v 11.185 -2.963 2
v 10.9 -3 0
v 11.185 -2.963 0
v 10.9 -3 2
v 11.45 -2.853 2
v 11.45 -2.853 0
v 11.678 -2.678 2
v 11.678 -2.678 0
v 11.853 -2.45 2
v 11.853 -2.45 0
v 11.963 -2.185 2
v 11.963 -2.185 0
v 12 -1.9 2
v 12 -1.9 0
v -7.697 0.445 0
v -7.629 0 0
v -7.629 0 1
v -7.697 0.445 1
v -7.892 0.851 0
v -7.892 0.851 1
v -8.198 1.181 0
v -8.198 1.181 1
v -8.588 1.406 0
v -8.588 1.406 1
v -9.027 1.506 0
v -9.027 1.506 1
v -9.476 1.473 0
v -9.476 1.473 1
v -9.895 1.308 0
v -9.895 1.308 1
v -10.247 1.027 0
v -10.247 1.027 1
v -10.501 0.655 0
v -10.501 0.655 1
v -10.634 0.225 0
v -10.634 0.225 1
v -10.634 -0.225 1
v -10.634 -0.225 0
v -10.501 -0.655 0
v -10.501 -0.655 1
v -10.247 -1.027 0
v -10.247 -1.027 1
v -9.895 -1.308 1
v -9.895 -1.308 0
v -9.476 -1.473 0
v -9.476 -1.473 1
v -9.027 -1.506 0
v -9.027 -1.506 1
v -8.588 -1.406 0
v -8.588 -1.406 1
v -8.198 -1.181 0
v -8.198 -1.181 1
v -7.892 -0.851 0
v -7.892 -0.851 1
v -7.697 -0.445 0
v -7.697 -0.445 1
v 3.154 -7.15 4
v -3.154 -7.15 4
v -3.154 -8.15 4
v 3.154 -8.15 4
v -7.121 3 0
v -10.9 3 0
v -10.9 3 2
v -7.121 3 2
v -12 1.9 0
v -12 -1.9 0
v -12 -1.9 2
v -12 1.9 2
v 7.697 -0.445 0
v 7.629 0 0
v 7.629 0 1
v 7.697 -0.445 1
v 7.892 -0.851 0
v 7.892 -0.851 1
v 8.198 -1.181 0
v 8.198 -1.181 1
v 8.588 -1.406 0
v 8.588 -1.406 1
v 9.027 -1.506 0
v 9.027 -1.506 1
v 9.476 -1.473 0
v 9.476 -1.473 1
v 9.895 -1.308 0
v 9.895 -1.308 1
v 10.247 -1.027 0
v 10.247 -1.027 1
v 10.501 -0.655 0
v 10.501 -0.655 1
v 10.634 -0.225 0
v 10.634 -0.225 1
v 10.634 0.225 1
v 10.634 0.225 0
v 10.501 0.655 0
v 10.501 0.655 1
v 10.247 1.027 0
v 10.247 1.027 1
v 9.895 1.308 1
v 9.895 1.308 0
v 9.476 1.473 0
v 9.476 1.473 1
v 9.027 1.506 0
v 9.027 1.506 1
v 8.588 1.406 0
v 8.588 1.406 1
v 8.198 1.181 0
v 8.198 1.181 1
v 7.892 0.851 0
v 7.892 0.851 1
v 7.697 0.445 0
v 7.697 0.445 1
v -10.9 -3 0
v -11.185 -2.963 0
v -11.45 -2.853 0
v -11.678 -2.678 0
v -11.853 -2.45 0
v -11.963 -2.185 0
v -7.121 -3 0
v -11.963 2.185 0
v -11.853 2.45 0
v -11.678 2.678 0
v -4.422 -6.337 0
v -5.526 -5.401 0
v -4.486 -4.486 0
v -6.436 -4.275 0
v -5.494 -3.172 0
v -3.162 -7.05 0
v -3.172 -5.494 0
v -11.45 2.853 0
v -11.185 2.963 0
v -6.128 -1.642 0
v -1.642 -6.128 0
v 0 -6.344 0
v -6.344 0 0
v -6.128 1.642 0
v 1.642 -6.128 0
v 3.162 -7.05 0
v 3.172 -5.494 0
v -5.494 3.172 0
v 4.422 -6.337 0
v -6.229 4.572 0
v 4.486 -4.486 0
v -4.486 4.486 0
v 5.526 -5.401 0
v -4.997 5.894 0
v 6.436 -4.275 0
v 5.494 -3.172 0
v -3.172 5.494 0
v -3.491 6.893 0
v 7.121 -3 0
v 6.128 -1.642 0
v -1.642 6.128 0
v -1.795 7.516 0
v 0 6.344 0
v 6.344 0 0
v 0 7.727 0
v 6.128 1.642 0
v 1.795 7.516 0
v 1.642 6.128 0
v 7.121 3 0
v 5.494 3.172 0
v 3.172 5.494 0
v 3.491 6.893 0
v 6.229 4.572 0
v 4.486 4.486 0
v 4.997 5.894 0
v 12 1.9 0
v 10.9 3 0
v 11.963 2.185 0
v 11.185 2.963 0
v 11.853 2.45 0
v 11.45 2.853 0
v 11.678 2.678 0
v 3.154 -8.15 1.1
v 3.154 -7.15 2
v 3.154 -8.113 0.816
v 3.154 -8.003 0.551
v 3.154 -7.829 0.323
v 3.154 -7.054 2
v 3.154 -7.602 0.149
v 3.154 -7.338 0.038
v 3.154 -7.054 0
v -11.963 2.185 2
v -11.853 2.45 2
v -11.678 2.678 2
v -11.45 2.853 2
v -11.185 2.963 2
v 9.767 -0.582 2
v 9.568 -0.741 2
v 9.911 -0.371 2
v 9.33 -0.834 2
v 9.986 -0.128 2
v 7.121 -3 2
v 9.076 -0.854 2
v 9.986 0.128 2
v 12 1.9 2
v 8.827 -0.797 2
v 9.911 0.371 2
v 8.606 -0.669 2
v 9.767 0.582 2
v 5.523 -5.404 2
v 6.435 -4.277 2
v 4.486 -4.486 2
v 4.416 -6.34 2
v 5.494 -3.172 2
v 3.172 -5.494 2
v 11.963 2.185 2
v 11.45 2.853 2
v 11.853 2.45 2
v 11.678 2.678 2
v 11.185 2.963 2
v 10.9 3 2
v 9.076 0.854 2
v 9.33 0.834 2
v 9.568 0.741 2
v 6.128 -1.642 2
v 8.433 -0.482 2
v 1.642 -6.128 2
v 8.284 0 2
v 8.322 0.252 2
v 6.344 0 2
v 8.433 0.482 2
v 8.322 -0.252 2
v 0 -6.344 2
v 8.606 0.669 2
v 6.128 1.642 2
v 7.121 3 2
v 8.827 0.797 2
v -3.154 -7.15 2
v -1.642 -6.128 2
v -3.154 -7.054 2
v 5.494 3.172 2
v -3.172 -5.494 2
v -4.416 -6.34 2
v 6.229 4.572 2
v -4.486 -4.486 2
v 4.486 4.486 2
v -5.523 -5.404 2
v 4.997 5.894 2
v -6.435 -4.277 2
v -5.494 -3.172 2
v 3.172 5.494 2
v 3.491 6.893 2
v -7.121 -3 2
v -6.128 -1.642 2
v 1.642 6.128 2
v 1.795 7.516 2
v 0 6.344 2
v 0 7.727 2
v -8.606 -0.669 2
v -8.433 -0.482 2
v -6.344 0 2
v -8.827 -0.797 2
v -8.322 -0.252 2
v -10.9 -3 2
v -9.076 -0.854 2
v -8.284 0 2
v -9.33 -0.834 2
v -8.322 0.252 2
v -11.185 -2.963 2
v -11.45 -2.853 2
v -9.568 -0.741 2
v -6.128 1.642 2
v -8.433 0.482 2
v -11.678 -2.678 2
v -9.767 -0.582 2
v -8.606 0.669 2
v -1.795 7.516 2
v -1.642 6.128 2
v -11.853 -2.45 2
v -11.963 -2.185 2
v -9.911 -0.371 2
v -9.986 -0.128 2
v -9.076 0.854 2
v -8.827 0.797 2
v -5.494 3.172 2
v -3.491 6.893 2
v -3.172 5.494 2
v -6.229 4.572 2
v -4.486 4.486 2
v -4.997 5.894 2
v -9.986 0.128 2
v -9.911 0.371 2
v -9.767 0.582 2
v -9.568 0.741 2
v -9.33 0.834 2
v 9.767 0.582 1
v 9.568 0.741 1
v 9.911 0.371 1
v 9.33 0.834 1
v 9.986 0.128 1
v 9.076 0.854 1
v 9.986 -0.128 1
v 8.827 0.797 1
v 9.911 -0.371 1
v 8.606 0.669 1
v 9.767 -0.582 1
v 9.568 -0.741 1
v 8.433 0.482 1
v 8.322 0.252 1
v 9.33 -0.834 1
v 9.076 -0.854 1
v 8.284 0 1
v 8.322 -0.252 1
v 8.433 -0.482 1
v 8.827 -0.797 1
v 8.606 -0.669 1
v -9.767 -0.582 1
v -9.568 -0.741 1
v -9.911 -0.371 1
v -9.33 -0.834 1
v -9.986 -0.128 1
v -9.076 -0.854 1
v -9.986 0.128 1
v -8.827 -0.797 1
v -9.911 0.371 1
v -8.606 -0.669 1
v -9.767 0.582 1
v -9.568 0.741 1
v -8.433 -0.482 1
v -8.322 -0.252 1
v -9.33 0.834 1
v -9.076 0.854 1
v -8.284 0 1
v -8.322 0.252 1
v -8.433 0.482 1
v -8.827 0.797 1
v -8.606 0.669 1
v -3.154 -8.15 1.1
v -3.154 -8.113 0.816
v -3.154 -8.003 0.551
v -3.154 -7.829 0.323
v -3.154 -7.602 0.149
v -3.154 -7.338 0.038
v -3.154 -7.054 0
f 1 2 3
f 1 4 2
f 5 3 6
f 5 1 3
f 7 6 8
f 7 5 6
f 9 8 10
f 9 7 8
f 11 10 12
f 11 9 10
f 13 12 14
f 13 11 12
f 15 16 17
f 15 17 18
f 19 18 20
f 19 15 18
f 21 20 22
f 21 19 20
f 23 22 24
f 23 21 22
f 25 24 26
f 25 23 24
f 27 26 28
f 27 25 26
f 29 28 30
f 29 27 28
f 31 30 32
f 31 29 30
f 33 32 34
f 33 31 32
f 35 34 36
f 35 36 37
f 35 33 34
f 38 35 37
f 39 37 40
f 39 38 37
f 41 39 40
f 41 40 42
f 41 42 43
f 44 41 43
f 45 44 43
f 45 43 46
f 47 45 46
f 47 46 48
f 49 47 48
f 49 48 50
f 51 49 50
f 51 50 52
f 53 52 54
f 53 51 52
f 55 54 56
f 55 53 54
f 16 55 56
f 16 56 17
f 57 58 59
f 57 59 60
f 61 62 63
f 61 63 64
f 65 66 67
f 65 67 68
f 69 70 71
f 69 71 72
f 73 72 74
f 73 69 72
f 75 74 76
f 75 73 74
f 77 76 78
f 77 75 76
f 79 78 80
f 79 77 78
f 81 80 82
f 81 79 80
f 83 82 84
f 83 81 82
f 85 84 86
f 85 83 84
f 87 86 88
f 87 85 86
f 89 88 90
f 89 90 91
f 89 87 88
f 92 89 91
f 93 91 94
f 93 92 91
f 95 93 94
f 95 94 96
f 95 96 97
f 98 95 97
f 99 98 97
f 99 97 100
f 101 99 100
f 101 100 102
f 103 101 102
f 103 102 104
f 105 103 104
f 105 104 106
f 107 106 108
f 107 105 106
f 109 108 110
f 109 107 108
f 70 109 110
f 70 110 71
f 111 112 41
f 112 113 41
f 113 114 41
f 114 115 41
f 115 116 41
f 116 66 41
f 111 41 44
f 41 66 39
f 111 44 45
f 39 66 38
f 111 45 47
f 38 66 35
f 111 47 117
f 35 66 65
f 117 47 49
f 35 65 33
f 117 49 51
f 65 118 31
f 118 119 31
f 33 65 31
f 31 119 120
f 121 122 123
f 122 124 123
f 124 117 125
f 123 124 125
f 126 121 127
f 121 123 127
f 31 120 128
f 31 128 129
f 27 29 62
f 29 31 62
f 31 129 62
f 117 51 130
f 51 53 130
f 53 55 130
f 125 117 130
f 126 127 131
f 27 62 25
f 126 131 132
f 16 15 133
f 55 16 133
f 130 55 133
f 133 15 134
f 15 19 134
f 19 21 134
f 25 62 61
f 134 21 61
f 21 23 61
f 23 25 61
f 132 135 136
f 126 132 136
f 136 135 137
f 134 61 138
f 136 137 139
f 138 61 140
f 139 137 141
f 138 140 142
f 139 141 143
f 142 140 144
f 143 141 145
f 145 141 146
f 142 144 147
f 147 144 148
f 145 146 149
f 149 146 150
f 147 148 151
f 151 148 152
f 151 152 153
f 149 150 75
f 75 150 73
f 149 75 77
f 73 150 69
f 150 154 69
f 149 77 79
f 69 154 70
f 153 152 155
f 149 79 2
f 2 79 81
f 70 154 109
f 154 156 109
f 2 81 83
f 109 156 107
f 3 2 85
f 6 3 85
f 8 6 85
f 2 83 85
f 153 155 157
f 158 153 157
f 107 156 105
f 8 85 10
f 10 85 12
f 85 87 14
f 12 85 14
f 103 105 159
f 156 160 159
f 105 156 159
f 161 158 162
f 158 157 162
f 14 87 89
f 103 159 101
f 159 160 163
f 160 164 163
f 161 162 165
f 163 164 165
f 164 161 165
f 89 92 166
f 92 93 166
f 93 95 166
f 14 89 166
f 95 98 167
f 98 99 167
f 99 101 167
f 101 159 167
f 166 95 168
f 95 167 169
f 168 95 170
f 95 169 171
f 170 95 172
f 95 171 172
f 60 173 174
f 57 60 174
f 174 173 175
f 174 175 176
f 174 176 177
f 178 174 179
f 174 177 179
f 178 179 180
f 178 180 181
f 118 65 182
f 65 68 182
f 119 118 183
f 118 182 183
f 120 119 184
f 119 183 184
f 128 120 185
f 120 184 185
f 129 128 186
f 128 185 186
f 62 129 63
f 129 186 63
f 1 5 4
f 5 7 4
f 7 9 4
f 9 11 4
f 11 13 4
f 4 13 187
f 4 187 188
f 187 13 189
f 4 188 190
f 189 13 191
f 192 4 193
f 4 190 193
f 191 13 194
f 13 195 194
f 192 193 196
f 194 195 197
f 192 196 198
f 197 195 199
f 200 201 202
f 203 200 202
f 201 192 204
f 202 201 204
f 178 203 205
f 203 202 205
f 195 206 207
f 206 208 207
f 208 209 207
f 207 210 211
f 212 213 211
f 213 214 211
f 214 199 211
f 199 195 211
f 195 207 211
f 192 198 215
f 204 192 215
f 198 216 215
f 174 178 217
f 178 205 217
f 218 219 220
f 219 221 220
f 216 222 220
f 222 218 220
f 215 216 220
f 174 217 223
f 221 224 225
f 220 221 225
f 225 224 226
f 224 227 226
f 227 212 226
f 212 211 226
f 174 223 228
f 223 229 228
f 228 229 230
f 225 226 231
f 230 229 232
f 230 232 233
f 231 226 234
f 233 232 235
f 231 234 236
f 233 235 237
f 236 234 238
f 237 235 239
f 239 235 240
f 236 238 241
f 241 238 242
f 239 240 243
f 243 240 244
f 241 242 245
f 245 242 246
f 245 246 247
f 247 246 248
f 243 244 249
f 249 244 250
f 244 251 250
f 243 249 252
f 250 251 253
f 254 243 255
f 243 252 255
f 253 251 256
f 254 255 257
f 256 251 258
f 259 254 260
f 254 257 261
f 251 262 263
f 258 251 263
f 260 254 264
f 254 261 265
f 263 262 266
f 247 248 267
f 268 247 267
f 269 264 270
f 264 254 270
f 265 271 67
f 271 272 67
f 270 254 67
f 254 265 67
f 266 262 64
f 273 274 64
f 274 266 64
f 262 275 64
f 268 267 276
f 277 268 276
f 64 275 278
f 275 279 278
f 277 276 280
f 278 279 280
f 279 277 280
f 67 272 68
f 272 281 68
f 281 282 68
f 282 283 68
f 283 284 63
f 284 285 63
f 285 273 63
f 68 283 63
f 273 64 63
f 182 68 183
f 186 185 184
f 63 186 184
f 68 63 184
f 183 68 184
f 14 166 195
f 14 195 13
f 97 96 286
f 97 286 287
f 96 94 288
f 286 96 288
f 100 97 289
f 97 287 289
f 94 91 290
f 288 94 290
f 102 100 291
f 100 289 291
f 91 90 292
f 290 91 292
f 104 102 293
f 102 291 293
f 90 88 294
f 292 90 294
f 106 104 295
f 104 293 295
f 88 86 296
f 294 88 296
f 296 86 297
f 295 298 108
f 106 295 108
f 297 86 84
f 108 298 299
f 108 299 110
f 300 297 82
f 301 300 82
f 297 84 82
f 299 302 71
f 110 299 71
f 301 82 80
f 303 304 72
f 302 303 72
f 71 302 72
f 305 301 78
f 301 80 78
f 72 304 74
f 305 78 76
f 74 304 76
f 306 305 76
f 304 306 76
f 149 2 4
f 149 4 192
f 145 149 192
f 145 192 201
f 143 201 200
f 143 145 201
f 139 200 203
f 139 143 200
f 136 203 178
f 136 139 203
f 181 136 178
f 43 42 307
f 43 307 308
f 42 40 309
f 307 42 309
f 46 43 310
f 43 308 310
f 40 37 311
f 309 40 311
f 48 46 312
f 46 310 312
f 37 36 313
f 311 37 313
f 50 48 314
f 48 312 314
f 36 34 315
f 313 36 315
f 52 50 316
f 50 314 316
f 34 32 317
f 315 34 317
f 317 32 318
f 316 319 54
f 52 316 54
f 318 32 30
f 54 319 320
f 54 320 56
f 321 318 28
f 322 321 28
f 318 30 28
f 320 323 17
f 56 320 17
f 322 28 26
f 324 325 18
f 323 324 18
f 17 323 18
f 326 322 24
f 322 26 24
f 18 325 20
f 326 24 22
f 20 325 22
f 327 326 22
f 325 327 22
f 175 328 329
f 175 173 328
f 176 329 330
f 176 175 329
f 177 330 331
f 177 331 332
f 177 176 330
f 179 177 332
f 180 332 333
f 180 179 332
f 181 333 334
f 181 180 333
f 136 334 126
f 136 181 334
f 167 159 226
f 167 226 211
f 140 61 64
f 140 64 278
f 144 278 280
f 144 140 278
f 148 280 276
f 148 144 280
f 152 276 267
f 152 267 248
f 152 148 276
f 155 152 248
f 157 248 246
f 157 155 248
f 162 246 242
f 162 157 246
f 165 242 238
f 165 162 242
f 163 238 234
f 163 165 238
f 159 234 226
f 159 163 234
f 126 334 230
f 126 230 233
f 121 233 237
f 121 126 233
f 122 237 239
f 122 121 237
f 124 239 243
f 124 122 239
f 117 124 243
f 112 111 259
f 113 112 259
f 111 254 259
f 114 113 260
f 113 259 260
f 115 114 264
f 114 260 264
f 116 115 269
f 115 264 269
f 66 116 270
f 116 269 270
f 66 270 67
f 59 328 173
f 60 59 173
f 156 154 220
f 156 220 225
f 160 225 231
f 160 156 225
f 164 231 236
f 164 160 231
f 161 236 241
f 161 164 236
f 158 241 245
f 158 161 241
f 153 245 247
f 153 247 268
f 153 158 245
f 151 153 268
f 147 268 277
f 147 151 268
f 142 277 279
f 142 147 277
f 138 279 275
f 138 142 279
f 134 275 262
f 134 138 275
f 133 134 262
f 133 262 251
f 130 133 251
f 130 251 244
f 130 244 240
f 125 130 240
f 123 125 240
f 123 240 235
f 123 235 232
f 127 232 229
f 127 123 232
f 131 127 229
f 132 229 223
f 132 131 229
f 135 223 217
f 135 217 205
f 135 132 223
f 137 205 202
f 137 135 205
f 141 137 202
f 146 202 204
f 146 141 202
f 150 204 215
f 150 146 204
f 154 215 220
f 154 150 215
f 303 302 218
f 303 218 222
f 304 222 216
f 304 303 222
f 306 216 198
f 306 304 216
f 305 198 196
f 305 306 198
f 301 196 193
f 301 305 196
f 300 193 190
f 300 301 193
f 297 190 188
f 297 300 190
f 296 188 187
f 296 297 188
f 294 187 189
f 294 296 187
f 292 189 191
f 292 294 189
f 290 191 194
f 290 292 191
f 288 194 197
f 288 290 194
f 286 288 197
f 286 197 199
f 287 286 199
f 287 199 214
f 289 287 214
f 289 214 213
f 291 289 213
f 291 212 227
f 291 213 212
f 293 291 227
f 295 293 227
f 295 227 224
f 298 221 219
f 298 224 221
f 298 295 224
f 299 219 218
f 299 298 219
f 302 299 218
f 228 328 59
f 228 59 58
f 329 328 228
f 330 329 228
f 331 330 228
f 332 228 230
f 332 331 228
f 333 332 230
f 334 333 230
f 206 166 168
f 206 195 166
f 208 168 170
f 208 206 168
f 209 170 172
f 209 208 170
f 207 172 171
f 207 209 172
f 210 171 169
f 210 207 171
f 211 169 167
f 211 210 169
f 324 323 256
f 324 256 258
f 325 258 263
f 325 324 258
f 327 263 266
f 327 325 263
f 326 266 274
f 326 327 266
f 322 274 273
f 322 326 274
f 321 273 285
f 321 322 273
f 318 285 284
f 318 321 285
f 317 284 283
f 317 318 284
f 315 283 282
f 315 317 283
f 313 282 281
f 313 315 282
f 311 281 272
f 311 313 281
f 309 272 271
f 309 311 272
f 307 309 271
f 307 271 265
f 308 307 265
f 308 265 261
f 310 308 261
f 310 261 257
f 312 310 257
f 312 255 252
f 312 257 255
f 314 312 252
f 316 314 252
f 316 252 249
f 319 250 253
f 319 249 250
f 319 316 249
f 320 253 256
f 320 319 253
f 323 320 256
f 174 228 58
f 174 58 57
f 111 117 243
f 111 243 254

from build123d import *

# Parameters (mm, degrees)
SKETCH_1_R          = 6.344055944
EXTRUDE_2_DEPTH     = 2
SKETCH_1_7_W        = 6.308806274
SKETCH_1_7_H        = 1
EXTRUDE_3_DEPTH     = 4
SKETCH_1_8_R        = 0.855944056
CUT_EXTRUDE_3_DEPTH = 3.5
SKETCH_1_9_R        = 1.51048951
CUT_EXTRUDE_4_DEPTH = 1
FILLET_2_R          = 1.1
FILLET_3_R          = 1.1


with BuildPart() as part:
    # 草图1 → 凸台-拉伸2 (new body)
    with BuildSketch(Plane.XY):
        with BuildLine():
            Line((3.154403137, -7.15), (-3.154403137, -7.15))
            Line((-3.154403137, -7.15), (-3.154403137, -7.053623266))
            ThreePointArc((-3.154403137, -7.053623266), (-5.522881331, -5.403854378), (-7.120664318, -3))
            Line((-7.120664318, -3), (-12, -3))
            Line((-12, -3), (-12, 3))
            Line((-12, 3), (-7.120664318, 3))
            ThreePointArc((-7.120664318, 3), (0, 7.726827314), (7.120664318, 3))
            Line((7.120664318, 3), (12, 3))
            Line((12, 3), (12, -3))
            Line((12, -3), (7.120664318, -3))
            ThreePointArc((7.120664318, -3), (5.522881331, -5.403854378), (3.154403137, -7.053623266))
            Line((3.154403137, -7.053623266), (3.154403137, -7.15))
        make_face()
        Circle(SKETCH_1_R, mode=Mode.SUBTRACT)
    extrude(amount=EXTRUDE_2_DEPTH)

    # 草图1<7> → 凸台-拉伸3 (add)
    with BuildSketch(Plane.XY):
        with Locations((0, -7.65)):
            Rectangle(SKETCH_1_7_W, SKETCH_1_7_H)
    extrude(amount=EXTRUDE_3_DEPTH)

    # 草图1<8> → 切除-拉伸3 (cut)
    with BuildSketch(Plane.XY):
        with Locations((-9.139979315, 0)):
            Circle(SKETCH_1_8_R)
        with Locations((9.139979315, 0)):
            Circle(SKETCH_1_8_R)
    extrude(amount=CUT_EXTRUDE_3_DEPTH, mode=Mode.SUBTRACT)

    # 草图1<9> → 切除-拉伸4 (cut)
    with BuildSketch(Plane.XY):
        with Locations((-9.139979315, 0)):
            Circle(SKETCH_1_9_R)
        with Locations((9.139979315, 0)):
            Circle(SKETCH_1_9_R)
    extrude(amount=CUT_EXTRUDE_4_DEPTH, mode=Mode.SUBTRACT)

    # 圆角2
    fillet_2_edges = [part.edges().sort_by_distance(p)[0] for p in [
        (0, -8.15, 0),
    ]]
    fillet(fillet_2_edges, radius=FILLET_2_R)

    # 圆角3
    fillet_3_edges = [part.edges().sort_by_distance(p)[0] for p in [
        (-12, -3, 1),
        (-12, 3, 1),
        (12, -3, 1),
        (12, 3, 1),
    ]]
    fillet(fillet_3_edges, radius=FILLET_3_R)


solid = part.part
